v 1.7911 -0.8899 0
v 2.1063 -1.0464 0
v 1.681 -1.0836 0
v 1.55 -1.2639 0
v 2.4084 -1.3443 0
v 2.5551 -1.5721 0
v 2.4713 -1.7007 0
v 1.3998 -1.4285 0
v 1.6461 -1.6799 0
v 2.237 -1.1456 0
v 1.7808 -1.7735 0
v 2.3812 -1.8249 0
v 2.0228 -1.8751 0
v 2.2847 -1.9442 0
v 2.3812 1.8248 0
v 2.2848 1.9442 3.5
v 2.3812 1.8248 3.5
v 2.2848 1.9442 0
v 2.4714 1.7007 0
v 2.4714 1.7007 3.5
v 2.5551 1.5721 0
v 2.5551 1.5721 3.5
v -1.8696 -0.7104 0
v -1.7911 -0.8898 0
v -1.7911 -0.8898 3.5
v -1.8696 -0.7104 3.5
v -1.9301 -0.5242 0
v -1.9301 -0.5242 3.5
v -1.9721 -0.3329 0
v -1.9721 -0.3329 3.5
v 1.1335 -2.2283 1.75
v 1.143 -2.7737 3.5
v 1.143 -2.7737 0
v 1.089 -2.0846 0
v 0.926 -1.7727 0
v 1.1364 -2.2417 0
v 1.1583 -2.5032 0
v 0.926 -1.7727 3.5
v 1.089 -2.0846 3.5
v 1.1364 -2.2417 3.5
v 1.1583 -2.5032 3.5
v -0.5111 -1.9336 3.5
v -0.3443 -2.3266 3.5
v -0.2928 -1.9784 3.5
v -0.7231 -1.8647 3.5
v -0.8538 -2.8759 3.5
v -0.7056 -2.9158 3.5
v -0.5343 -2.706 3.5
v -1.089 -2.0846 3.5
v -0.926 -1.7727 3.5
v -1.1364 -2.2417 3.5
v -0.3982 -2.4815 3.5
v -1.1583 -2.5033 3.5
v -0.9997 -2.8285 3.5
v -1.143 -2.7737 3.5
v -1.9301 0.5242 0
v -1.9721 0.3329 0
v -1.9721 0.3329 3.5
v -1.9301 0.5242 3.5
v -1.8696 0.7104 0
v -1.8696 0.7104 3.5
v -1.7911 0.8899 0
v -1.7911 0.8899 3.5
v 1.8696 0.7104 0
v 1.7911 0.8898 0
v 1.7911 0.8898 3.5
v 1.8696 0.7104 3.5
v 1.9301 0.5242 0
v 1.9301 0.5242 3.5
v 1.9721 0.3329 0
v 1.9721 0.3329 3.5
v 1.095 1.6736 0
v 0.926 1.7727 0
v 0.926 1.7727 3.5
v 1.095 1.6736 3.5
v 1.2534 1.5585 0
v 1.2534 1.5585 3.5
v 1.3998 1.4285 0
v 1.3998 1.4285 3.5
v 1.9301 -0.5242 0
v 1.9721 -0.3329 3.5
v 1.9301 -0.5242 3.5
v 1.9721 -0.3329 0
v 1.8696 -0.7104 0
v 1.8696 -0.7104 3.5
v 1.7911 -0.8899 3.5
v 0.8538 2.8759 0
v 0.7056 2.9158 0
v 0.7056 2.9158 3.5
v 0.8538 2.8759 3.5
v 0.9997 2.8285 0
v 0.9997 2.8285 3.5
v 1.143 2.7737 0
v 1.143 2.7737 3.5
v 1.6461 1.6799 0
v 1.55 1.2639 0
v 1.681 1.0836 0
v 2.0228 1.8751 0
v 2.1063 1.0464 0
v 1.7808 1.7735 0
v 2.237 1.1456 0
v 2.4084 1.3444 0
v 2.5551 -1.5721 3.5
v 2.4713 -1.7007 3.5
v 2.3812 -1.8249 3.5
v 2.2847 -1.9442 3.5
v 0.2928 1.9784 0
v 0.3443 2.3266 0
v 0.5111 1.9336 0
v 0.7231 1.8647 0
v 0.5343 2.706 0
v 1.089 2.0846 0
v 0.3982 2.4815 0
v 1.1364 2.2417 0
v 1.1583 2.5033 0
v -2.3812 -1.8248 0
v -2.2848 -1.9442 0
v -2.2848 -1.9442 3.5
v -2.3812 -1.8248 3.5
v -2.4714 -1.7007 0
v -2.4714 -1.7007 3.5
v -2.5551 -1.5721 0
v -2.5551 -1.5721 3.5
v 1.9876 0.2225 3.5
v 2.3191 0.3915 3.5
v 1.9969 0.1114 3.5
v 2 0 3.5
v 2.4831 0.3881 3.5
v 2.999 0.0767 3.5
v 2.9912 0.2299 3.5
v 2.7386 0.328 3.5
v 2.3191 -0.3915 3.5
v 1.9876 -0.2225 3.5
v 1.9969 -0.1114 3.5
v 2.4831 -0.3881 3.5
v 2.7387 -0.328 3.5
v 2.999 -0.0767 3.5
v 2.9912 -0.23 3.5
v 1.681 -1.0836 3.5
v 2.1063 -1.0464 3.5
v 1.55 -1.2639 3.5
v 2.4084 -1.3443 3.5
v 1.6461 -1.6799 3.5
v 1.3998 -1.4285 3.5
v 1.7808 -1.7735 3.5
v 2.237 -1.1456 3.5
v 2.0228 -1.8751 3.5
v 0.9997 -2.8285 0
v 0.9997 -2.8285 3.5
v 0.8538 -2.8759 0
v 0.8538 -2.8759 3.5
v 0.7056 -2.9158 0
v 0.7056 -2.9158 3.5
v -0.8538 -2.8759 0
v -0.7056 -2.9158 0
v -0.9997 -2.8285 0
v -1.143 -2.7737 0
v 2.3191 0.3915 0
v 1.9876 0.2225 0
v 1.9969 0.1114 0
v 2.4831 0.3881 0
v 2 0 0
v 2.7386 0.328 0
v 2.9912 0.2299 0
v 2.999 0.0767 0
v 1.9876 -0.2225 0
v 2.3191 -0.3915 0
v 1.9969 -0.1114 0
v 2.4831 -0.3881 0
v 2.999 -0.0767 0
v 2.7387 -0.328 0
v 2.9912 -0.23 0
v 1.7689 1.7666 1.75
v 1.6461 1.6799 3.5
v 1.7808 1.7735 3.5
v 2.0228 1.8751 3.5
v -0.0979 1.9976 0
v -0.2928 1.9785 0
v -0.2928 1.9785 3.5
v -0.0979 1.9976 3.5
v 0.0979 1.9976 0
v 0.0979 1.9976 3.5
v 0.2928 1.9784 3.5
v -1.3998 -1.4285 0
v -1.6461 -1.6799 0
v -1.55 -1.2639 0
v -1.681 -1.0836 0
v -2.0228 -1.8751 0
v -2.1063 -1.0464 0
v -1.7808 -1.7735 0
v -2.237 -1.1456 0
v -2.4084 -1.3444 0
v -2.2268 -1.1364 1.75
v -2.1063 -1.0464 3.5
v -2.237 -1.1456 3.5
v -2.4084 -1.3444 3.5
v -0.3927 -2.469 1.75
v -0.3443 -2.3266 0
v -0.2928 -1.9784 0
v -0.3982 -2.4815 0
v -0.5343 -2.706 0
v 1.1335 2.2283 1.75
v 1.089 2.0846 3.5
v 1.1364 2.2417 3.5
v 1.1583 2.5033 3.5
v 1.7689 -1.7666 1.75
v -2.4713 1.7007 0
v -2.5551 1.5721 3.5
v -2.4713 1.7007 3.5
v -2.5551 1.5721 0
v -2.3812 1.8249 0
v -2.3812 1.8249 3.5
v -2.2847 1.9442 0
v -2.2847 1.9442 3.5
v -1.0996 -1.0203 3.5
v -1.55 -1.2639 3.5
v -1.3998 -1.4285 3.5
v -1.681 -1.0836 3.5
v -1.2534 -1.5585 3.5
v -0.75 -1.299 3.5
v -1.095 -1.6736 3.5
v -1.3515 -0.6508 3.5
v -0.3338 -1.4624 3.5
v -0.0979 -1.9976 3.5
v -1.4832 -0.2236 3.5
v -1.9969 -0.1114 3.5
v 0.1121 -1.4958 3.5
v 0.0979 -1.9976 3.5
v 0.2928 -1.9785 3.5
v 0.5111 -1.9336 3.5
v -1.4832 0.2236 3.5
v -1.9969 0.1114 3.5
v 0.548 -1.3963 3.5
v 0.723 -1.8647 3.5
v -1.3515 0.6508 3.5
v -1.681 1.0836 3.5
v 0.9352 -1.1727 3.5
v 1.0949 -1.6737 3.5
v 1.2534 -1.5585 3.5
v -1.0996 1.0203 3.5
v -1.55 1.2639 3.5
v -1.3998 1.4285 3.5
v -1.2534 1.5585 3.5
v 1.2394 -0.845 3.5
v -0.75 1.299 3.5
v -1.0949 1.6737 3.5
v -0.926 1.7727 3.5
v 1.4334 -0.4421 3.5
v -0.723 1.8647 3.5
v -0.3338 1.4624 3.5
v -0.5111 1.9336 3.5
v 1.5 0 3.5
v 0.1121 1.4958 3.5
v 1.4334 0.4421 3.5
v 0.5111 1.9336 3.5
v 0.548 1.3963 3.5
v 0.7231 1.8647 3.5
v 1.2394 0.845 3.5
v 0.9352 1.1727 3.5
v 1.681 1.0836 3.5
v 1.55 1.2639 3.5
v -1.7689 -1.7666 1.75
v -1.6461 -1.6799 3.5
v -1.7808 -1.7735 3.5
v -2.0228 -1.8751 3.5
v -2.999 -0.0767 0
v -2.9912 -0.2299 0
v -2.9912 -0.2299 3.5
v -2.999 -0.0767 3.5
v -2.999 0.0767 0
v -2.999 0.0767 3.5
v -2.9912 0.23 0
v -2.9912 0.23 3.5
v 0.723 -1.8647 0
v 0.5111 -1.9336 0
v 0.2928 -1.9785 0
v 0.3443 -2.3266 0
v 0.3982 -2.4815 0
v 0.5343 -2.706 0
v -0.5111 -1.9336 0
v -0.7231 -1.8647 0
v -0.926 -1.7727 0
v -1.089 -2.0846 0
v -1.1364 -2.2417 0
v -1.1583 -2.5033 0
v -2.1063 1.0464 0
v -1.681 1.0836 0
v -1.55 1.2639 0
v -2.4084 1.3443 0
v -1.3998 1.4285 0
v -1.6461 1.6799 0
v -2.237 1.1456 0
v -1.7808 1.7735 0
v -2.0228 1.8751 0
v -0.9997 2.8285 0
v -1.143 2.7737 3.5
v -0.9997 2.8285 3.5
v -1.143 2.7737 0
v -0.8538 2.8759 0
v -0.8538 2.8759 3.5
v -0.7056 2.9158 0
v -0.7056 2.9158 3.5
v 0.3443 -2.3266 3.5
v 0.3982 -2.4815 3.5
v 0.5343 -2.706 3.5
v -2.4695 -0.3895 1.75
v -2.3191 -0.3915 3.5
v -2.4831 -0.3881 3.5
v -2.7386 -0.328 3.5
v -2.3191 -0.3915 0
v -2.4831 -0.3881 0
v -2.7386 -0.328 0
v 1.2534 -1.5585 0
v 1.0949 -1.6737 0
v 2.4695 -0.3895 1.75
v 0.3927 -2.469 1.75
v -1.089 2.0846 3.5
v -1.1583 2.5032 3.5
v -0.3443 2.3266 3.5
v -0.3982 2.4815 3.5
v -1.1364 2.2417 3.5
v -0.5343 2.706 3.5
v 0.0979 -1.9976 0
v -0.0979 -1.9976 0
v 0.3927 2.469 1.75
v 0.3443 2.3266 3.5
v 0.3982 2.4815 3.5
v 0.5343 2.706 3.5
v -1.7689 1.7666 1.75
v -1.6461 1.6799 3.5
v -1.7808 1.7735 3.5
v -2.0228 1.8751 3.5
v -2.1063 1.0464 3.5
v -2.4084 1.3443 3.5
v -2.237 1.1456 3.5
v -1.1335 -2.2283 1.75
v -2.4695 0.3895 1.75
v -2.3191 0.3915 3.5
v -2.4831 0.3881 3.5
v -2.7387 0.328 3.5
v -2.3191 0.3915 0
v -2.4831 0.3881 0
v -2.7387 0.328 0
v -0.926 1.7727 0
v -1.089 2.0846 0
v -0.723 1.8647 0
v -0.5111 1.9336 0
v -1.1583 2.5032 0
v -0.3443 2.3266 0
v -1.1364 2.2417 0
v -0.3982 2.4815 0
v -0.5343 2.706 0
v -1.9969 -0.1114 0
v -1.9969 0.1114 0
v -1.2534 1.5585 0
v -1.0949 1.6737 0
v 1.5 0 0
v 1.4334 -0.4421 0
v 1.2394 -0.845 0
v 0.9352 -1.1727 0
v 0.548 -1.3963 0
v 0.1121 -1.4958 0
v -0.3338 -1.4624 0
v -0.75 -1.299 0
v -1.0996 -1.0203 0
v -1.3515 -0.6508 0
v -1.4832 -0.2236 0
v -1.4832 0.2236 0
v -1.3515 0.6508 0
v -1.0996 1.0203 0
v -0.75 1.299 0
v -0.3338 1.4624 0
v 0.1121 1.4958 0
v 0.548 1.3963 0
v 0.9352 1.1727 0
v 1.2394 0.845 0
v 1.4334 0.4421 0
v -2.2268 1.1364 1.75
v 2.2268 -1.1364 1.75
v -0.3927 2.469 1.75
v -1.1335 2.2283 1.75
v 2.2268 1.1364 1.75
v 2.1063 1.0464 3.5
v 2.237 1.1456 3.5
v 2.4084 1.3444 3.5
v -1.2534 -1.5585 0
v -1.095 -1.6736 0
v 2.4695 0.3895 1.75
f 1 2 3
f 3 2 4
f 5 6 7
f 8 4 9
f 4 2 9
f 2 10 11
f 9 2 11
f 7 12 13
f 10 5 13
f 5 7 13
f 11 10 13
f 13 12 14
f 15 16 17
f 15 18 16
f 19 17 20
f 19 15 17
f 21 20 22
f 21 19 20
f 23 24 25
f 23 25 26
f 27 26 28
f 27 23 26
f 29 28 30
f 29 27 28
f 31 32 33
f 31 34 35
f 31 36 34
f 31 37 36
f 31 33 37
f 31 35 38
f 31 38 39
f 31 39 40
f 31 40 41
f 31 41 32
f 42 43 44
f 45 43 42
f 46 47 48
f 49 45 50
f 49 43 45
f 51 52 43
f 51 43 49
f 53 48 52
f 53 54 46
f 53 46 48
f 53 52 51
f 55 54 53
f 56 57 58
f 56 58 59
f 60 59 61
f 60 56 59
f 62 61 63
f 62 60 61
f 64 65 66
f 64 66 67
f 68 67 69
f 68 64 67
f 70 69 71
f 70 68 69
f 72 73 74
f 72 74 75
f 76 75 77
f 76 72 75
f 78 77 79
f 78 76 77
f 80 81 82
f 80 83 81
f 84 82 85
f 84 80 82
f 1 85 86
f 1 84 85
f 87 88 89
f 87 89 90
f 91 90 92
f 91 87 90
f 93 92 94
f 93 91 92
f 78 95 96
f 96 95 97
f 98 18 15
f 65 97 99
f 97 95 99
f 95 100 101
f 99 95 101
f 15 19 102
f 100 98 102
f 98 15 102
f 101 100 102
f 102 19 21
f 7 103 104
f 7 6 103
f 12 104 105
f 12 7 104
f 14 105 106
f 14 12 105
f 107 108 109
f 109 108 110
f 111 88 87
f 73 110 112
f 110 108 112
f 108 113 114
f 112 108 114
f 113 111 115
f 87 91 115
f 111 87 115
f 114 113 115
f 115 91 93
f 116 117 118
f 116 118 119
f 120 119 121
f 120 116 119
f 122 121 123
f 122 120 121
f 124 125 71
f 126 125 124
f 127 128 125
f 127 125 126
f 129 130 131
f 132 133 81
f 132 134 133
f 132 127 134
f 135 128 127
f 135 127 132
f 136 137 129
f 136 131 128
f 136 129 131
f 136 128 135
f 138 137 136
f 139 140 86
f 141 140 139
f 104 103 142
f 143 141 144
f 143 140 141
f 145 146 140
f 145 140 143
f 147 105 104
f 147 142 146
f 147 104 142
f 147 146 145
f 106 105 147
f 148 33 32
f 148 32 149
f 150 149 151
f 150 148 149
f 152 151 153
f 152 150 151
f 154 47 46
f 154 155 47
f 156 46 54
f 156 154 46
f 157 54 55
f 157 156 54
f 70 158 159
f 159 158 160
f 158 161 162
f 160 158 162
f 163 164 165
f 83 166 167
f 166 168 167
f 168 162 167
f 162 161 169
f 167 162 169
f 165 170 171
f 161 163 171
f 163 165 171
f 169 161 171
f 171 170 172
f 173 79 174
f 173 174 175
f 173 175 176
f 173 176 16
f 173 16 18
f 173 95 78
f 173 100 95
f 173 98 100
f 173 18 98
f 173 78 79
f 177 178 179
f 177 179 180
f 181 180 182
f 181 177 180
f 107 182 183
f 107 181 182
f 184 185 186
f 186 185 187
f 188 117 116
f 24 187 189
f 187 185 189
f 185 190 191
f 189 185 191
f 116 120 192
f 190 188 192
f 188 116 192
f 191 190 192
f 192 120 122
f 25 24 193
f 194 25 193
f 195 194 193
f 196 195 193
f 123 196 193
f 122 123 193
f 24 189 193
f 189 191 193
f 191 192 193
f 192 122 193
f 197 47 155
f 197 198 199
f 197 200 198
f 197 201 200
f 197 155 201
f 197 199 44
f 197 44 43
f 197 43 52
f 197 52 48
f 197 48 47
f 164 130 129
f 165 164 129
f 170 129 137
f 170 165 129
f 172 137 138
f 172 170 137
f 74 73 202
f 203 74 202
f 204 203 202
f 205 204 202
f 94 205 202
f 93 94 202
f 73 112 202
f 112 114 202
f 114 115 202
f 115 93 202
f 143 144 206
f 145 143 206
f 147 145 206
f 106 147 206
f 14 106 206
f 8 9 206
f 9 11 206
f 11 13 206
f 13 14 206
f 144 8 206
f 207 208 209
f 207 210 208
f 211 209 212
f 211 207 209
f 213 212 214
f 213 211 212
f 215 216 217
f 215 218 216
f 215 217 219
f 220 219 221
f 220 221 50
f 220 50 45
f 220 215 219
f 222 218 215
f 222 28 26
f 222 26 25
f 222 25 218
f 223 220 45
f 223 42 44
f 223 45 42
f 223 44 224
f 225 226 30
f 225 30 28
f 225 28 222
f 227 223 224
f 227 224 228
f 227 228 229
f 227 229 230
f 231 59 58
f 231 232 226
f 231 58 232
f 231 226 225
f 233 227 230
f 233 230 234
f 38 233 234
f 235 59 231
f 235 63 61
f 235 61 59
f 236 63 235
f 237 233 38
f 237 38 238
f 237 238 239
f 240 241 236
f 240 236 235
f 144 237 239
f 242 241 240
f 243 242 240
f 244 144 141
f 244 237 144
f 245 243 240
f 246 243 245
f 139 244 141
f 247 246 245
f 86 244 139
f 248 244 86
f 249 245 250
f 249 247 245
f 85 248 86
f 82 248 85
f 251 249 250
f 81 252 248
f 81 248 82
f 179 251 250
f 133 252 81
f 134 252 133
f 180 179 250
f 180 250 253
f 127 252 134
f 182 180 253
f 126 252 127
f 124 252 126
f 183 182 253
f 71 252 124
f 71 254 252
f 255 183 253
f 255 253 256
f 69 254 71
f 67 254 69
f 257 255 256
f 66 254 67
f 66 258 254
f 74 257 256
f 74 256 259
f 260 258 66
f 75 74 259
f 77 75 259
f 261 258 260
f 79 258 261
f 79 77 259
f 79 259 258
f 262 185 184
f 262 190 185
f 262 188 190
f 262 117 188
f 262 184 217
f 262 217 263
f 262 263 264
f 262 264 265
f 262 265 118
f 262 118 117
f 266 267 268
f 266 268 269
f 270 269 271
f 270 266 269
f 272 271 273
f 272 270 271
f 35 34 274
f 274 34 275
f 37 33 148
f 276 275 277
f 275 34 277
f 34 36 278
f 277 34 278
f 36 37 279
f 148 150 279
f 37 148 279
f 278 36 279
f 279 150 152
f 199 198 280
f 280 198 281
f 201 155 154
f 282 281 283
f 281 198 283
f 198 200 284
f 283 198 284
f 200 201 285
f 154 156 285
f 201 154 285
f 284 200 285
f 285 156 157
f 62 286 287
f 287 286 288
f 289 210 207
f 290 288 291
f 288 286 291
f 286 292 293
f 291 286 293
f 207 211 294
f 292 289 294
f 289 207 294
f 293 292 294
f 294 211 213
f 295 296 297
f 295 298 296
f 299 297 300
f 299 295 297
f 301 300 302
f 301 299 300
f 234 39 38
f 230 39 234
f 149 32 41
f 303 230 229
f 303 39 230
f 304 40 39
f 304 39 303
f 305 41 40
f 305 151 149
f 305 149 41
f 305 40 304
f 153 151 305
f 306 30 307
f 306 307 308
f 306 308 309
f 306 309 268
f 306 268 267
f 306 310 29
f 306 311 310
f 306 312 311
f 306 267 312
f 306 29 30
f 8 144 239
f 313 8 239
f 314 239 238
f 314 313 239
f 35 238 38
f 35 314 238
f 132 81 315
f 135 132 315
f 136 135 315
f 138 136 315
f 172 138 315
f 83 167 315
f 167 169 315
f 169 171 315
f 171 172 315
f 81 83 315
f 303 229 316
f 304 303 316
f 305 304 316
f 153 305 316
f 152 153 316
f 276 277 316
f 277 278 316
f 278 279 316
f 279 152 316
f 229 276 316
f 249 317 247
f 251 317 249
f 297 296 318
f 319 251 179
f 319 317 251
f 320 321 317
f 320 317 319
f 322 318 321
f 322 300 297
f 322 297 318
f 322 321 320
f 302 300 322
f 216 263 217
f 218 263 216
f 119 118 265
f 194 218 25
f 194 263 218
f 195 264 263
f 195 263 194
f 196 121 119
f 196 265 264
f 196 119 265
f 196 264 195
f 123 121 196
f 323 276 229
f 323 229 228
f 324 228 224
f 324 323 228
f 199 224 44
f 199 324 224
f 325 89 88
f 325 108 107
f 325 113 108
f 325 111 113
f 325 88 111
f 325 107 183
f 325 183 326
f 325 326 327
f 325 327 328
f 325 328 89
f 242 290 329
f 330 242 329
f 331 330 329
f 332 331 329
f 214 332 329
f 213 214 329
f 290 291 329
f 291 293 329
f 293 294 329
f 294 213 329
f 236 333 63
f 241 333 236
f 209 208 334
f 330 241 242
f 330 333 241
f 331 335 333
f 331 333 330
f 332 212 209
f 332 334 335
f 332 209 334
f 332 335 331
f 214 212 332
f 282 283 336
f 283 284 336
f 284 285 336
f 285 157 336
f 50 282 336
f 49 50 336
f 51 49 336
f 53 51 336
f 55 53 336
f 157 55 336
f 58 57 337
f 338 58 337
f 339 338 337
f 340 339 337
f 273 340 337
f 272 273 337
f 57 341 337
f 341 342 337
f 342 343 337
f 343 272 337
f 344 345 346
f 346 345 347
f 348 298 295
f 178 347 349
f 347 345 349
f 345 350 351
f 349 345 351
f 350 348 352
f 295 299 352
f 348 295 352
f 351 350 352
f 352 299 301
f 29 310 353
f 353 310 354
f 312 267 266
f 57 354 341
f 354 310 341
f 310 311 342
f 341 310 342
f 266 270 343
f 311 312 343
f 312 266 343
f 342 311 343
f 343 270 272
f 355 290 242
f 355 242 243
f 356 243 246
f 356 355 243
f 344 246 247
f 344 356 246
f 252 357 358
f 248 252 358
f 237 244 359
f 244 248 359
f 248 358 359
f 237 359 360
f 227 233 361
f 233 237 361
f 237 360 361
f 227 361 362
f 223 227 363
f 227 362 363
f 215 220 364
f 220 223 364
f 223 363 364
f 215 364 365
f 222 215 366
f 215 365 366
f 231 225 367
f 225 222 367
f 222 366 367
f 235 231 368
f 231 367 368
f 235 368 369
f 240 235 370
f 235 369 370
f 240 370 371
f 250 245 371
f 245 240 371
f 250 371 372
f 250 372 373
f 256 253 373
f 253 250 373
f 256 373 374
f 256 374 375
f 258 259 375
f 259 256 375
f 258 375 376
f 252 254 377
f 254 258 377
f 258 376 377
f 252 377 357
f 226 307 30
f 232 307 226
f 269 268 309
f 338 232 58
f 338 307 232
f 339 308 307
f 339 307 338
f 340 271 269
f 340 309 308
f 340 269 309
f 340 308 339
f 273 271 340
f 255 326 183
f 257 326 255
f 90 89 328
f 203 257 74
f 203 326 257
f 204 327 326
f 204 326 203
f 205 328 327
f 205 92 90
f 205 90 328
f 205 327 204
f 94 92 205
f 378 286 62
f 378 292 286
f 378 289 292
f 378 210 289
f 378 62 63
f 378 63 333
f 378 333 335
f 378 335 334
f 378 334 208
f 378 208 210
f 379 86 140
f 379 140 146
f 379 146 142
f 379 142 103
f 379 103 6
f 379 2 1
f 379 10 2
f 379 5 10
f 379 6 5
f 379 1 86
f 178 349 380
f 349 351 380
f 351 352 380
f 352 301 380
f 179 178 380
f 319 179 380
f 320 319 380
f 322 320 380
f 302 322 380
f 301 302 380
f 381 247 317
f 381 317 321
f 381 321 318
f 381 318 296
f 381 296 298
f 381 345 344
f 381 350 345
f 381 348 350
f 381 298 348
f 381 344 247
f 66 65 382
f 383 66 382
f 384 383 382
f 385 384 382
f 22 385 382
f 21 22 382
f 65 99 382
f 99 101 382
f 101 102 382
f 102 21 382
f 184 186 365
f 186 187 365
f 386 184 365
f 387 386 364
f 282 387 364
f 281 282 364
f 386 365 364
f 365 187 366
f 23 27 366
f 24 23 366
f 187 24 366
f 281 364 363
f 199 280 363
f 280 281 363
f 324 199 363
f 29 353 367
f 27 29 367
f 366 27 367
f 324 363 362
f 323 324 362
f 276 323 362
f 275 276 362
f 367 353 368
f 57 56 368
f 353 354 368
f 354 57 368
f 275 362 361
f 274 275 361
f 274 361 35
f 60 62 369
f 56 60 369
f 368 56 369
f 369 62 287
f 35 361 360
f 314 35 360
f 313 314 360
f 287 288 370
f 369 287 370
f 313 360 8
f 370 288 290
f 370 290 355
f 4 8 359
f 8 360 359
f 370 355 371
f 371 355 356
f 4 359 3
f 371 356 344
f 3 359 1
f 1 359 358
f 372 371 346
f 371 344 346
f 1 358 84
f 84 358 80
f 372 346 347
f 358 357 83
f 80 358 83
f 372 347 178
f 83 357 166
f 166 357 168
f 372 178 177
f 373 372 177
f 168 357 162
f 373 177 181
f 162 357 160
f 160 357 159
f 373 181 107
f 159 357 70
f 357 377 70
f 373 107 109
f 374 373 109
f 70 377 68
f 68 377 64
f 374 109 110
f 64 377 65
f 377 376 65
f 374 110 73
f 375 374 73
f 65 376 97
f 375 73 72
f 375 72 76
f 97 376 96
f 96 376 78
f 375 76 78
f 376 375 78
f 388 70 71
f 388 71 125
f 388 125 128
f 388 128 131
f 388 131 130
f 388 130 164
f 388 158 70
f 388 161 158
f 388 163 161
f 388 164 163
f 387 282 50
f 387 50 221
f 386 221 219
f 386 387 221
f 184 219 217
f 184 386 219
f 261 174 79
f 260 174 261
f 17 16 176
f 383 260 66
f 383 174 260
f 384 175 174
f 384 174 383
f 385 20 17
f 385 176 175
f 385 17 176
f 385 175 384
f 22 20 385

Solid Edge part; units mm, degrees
sketch "Sketch1" plane through (0, 0, 0) normal (0, 0, 1) x (1, 0, 0)
  spline S0 degree 3 poles (-0.2928, 1.9785) (-0.306, 2.1503) (-0.3512, 2.501) (-0.5844, 2.7739) (-0.7056, 2.9158) knots 0 0 0 0 0.479886 1 1 1 1
  arc A0 (-0.7056, 2.9158) -> (-1.143, 2.7737) centre (0, 0) ccw
  spline S1 degree 3 poles (-0.926, 1.7727) (-1.0163, 1.9195) (-1.1859, 2.2298) (-1.1577, 2.5876) (-1.143, 2.7737) knots 0 0 0 0 0.479886 1 1 1 1
  arc A1 (-0.926, 1.7727) -> (-0.2928, 1.9785) centre (0, 0) cw
extrude "Protrusion1" add sketch "Sketch1" along normal blind 3.5
sketch "Sketch2" plane through (0, 0, 0) normal (0, 0, 1) x (1, 0, 0)
  circle A0 centre (0, 0) radius 1.5
  circle A1 centre (0, 0) radius 2
extrude "Rad" add sketch "Sketch2" along normal blind 3.5
pattern_circular "Pattern1" count 10 over 360 about axis through (0, 0, 0) along (0, 0, 1) of "Protrusion1"
